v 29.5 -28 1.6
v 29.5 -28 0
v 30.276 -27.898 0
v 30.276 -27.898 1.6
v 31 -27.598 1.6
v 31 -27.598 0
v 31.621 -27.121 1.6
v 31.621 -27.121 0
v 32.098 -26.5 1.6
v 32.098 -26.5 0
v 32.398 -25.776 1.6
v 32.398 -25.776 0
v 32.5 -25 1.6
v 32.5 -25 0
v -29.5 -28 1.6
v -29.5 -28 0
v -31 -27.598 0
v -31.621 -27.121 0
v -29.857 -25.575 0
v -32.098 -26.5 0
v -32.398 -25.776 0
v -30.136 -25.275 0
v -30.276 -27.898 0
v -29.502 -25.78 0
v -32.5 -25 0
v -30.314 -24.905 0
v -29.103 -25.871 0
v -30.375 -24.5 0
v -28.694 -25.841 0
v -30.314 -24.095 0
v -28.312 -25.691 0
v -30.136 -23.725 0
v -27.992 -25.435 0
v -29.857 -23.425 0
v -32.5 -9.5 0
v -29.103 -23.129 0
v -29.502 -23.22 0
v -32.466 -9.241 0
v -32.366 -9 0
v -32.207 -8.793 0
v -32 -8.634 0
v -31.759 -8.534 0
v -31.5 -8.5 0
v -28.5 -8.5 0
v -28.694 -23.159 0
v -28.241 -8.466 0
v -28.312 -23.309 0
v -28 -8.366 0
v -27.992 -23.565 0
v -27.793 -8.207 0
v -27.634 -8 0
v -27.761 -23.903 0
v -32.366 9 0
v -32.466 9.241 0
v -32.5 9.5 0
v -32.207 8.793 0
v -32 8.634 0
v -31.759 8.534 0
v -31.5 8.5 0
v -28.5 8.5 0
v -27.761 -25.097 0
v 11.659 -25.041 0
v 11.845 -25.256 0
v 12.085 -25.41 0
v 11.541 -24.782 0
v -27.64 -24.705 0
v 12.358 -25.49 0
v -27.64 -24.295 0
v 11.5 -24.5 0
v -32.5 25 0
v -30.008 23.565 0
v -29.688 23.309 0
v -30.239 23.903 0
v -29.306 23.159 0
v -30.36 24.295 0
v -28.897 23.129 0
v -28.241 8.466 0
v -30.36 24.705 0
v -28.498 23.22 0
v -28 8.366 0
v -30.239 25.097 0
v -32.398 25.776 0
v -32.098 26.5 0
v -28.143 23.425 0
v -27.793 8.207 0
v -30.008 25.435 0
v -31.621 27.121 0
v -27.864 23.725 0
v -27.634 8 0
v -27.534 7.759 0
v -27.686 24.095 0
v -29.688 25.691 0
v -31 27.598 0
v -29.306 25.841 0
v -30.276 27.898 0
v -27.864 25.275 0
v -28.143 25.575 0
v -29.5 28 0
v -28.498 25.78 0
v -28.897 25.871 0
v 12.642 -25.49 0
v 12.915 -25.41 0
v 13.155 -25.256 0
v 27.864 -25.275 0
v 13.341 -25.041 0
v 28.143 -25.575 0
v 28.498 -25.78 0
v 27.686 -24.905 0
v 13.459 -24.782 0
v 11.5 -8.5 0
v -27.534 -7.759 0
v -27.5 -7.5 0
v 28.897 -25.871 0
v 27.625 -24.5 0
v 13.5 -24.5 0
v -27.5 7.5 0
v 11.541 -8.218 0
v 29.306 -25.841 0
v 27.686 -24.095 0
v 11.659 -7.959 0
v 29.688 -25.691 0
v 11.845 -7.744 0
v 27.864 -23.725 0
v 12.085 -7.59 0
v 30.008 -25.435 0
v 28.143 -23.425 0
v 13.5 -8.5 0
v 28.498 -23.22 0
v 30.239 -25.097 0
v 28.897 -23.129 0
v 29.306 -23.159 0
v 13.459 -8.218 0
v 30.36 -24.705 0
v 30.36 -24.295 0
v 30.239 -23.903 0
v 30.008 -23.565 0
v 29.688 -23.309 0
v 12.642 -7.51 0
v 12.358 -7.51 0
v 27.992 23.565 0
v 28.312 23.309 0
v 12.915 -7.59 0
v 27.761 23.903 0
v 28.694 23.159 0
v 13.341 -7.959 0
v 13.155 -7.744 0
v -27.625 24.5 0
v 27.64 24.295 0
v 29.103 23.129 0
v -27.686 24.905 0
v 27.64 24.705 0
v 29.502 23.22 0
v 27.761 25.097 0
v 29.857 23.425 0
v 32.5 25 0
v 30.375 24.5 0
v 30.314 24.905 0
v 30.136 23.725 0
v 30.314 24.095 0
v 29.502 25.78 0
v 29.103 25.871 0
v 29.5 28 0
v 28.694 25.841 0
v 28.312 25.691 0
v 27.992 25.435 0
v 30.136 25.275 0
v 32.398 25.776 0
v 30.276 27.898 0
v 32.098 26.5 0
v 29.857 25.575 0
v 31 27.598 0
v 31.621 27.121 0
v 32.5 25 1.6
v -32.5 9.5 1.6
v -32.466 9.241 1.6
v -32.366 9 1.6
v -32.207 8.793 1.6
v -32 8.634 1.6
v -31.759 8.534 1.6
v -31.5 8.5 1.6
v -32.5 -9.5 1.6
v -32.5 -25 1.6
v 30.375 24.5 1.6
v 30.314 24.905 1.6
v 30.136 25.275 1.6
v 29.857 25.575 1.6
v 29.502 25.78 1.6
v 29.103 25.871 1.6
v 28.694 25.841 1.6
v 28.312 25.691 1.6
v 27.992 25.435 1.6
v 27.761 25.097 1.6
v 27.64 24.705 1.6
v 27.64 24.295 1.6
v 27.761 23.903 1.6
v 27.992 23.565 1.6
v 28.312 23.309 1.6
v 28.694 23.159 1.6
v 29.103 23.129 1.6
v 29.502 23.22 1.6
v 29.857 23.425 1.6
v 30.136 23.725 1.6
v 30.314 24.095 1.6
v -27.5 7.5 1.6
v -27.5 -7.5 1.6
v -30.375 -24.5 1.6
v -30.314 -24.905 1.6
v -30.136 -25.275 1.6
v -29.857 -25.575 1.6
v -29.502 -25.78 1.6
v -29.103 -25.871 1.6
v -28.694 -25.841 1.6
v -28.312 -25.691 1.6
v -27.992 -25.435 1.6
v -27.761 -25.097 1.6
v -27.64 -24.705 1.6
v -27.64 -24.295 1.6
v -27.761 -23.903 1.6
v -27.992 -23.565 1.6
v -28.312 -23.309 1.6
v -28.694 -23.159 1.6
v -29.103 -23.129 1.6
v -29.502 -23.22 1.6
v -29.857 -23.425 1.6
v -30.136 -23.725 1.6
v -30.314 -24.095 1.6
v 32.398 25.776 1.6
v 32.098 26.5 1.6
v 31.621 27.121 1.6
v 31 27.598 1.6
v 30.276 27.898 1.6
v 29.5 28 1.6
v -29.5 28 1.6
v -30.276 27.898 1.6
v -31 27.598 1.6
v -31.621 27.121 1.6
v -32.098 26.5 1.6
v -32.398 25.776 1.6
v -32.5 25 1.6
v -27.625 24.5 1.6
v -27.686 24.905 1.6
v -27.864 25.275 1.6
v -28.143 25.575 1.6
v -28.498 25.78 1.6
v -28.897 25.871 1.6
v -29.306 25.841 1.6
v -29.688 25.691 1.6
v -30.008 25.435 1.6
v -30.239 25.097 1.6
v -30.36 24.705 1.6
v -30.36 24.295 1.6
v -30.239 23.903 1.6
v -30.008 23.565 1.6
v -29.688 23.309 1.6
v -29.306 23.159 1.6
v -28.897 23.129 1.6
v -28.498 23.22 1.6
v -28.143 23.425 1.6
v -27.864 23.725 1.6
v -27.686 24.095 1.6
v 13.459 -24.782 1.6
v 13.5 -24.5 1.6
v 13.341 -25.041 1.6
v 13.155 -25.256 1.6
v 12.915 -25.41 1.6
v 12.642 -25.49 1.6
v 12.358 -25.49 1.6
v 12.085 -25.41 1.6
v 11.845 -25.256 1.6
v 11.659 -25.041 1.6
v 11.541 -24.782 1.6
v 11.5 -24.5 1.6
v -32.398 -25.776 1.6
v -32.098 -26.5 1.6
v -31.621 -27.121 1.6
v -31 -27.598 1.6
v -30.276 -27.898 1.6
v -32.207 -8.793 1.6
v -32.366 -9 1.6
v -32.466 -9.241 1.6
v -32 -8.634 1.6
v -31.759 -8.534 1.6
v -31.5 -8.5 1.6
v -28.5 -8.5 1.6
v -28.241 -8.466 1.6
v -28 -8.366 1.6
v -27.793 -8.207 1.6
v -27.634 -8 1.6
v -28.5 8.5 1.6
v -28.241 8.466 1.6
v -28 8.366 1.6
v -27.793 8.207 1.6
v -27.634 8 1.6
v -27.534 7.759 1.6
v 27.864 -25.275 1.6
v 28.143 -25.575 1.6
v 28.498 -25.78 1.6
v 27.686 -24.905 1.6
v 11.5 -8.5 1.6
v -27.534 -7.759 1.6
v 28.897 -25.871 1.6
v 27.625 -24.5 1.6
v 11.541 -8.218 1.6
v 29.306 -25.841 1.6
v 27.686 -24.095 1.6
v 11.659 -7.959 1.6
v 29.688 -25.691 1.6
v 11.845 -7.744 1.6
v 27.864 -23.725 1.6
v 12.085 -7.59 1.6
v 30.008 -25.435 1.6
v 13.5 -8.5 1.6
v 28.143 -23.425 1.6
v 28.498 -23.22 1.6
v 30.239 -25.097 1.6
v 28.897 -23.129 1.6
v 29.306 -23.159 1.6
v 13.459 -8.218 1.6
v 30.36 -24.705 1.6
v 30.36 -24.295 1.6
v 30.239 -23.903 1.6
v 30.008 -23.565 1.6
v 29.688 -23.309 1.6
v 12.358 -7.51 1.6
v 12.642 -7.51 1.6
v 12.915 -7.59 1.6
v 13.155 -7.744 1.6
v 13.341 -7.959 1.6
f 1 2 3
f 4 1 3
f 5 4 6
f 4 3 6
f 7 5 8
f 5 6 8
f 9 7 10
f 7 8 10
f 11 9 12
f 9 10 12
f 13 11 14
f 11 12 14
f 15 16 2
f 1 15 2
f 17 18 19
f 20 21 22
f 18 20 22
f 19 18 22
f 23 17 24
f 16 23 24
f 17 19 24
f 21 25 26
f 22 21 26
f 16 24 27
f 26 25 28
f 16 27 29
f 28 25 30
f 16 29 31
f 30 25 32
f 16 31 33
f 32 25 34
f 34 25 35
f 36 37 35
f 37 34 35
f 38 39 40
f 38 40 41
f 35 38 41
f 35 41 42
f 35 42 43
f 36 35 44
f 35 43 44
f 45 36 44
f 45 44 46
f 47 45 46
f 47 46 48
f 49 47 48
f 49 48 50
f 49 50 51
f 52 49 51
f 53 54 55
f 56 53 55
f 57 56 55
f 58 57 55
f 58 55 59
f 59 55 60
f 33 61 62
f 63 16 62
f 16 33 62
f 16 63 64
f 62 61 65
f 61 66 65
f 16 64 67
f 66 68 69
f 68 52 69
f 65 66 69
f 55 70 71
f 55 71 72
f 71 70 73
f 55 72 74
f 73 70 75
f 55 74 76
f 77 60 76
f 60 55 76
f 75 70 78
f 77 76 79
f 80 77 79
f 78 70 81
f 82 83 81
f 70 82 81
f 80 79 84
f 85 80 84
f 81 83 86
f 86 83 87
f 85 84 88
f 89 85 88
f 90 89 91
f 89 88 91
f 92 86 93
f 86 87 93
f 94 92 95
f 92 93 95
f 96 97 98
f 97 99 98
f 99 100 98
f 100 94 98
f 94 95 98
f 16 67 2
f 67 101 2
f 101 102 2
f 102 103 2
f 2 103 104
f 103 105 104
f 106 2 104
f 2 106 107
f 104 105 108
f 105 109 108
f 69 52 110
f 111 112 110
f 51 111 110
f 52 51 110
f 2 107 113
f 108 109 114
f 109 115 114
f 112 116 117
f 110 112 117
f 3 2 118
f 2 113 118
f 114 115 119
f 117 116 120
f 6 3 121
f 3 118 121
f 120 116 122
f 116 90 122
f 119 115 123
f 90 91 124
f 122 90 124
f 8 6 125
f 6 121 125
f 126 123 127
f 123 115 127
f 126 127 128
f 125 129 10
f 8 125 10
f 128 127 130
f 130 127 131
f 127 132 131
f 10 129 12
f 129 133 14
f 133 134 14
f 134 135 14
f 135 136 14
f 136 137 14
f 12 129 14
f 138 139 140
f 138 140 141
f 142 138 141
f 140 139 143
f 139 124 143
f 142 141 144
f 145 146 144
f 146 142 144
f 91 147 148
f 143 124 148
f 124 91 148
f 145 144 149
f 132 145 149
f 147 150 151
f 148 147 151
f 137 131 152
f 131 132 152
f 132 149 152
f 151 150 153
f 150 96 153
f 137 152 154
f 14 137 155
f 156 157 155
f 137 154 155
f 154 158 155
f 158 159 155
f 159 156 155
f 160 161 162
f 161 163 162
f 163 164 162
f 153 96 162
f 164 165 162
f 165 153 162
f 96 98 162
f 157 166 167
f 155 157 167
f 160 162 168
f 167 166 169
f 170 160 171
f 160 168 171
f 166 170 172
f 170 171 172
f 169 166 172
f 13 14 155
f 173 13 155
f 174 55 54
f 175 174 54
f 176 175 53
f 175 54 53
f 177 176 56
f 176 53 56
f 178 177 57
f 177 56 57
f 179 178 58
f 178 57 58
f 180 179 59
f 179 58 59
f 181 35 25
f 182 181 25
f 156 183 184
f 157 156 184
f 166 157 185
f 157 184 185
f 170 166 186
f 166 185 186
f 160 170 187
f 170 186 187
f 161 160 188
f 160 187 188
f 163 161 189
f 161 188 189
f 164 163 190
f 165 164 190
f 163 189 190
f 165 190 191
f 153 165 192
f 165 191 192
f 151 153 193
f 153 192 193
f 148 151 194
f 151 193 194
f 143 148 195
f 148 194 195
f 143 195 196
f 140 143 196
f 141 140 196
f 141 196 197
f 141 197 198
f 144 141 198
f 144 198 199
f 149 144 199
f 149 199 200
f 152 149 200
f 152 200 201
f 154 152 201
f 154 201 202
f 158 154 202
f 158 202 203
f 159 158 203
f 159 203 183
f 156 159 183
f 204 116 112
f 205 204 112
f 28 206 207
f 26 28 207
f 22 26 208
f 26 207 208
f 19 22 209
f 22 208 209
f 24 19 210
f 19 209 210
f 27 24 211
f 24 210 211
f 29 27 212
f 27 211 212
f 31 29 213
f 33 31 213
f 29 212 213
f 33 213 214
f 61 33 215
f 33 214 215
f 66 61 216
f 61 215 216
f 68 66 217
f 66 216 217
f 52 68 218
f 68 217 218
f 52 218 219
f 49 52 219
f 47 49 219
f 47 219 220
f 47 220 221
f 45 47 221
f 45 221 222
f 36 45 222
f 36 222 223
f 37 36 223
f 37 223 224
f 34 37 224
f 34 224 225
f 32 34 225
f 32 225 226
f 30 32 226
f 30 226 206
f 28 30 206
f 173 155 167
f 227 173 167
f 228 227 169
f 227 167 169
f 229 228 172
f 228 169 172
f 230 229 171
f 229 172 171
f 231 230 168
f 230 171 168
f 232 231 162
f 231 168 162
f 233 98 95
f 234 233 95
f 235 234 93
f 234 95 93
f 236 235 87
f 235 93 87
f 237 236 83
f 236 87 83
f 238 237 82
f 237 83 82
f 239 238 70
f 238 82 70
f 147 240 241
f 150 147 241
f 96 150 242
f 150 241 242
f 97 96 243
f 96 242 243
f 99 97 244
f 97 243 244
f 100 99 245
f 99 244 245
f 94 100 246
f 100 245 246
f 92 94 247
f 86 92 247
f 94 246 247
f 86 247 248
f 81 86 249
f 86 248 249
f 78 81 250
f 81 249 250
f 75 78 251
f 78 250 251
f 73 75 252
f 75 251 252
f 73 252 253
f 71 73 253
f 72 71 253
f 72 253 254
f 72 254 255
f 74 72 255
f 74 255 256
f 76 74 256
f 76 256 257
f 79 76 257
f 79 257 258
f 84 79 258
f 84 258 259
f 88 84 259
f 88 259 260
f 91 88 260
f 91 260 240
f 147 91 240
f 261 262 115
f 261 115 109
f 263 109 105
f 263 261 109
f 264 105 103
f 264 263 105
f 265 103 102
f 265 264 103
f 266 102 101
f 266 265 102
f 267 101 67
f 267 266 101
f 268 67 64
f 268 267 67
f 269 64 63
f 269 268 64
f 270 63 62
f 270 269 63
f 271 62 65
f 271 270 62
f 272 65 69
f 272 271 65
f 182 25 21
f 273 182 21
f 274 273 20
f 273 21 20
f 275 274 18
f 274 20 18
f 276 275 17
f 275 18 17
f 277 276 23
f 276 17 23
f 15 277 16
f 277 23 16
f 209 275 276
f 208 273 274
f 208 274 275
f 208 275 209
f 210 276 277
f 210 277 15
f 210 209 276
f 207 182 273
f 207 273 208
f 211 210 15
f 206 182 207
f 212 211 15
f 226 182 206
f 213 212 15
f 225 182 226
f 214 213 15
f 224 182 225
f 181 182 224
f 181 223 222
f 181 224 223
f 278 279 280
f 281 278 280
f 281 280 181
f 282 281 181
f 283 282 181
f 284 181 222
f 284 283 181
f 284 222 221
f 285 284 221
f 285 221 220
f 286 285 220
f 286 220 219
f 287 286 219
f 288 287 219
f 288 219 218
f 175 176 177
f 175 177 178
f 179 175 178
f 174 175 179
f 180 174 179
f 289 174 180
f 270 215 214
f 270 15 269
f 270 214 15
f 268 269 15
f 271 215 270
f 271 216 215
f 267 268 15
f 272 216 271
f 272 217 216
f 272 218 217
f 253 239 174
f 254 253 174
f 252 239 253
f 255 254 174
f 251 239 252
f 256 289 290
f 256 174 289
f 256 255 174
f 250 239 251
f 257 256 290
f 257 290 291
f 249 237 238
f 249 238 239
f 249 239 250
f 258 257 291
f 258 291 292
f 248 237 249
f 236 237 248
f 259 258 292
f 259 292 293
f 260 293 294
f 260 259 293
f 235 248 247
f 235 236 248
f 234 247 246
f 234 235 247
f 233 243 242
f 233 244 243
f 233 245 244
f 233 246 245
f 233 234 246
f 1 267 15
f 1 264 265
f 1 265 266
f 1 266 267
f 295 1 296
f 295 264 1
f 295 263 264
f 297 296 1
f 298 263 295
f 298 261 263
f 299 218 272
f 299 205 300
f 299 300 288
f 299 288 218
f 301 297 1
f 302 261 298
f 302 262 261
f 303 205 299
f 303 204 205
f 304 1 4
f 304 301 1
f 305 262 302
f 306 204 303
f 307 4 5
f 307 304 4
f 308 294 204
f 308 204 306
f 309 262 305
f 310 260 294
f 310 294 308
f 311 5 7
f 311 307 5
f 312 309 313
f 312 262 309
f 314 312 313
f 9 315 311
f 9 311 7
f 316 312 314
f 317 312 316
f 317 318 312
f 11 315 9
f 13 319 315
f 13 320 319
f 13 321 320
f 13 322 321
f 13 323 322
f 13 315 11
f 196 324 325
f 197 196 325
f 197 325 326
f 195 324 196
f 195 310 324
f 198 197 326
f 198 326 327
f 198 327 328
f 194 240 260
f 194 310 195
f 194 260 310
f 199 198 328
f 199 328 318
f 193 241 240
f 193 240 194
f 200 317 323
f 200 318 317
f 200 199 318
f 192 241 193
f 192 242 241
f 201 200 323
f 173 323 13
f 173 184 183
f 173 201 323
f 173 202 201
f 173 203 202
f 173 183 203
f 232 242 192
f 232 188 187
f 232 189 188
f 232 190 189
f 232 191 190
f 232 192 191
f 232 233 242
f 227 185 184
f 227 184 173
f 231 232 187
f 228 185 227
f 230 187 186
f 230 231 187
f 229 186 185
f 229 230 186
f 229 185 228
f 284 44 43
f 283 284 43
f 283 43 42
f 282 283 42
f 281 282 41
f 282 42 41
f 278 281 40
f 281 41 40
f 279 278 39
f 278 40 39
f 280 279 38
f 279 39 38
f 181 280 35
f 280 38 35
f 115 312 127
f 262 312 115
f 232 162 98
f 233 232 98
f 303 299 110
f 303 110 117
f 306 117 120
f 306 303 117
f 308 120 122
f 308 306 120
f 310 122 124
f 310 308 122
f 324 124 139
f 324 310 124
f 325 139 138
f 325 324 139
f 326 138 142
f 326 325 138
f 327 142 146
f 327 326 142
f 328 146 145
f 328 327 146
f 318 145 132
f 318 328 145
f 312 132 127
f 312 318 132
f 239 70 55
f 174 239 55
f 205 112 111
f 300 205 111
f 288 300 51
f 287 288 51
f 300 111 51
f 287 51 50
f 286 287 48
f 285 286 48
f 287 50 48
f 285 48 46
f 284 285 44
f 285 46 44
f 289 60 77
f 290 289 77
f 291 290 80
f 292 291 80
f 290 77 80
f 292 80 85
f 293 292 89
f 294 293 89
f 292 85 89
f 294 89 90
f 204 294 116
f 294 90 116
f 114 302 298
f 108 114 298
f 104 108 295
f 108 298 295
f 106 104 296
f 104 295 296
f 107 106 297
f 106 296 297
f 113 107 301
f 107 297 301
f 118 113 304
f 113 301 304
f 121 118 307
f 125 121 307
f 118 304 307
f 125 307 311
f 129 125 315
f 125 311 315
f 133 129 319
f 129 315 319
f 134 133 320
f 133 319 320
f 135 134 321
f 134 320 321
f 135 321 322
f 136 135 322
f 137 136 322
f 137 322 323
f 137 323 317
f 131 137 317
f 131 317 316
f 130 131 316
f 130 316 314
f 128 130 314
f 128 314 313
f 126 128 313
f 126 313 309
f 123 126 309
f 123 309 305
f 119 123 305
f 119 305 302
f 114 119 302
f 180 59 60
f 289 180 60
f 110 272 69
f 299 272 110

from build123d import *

# Parameters (mm, degrees)
BOSS_EXTRUDE1_DEPTH = 1.6
CUT_EXTRUDE1_DEPTH  = 43.927962915
SKETCH4_R           = 1.375
CUT_EXTRUDE2_DEPTH  = 43.927962915


with BuildPart() as part:
    # Sketch1 → Boss-Extrude1 (new body)
    with BuildSketch(Plane.XY):
        with BuildLine():
            Line((-29.5, -28), (29.5, -28))
            ThreePointArc((29.5, -28), (31.621320344, -27.121320344), (32.5, -25))
            Line((32.5, -25), (32.5, 25))
            ThreePointArc((32.5, 25), (31.621320344, 27.121320344), (29.5, 28))
            Line((29.5, 28), (-29.5, 28))
            ThreePointArc((-29.5, 28), (-31.621320344, 27.121320344), (-32.5, 25))
            Line((-32.5, 25), (-32.5, 9.5))
            ThreePointArc((-32.5, 9.5), (-32.207106781, 8.792893219), (-31.5, 8.5))
            Line((-31.5, 8.5), (-28.5, 8.5))
            ThreePointArc((-28.5, 8.5), (-27.792893219, 8.207106781), (-27.5, 7.5))
            Line((-27.5, 7.5), (-27.5, -7.5))
            ThreePointArc((-27.5, -7.5), (-27.792893219, -8.207106781), (-28.5, -8.5))
            Line((-28.5, -8.5), (-31.5, -8.5))
            ThreePointArc((-31.5, -8.5), (-32.207106781, -8.792893219), (-32.5, -9.5))
            Line((-32.5, -9.5), (-32.5, -25))
            ThreePointArc((-32.5, -25), (-31.621320344, -27.121320344), (-29.5, -28))
        make_face()
    extrude(amount=BOSS_EXTRUDE1_DEPTH)

    # Sketch3 → Cut-Extrude1 (cut, through all)
    with BuildSketch(Plane.XY.offset(1.6)):
        with BuildLine():
            Line((13.5, -8.5), (13.5, -24.5))
            ThreePointArc((13.5, -24.5), (12.5, -25.5), (11.5, -24.5))
            Line((11.5, -24.5), (11.5, -8.5))
            ThreePointArc((11.5, -8.5), (12.5, -7.5), (13.5, -8.5))
        make_face()
    extrude(amount=-CUT_EXTRUDE1_DEPTH, mode=Mode.SUBTRACT)

    # Sketch4 → Cut-Extrude2 (cut, through all)
    with BuildSketch(Plane.XY.offset(1.6)):
        with Locations((-29, 24.5)):
            Circle(SKETCH4_R)
        with Locations((29, 24.5)):
            Circle(SKETCH4_R)
        with Locations(Location((29, -24.5, 0), (0, 0, 180))):
            Circle(SKETCH4_R)
        with Locations(Location((-29, -24.5, 0), (0, 0, 180))):
            Circle(SKETCH4_R)
    extrude(amount=-CUT_EXTRUDE2_DEPTH, mode=Mode.SUBTRACT)


solid = part.part
